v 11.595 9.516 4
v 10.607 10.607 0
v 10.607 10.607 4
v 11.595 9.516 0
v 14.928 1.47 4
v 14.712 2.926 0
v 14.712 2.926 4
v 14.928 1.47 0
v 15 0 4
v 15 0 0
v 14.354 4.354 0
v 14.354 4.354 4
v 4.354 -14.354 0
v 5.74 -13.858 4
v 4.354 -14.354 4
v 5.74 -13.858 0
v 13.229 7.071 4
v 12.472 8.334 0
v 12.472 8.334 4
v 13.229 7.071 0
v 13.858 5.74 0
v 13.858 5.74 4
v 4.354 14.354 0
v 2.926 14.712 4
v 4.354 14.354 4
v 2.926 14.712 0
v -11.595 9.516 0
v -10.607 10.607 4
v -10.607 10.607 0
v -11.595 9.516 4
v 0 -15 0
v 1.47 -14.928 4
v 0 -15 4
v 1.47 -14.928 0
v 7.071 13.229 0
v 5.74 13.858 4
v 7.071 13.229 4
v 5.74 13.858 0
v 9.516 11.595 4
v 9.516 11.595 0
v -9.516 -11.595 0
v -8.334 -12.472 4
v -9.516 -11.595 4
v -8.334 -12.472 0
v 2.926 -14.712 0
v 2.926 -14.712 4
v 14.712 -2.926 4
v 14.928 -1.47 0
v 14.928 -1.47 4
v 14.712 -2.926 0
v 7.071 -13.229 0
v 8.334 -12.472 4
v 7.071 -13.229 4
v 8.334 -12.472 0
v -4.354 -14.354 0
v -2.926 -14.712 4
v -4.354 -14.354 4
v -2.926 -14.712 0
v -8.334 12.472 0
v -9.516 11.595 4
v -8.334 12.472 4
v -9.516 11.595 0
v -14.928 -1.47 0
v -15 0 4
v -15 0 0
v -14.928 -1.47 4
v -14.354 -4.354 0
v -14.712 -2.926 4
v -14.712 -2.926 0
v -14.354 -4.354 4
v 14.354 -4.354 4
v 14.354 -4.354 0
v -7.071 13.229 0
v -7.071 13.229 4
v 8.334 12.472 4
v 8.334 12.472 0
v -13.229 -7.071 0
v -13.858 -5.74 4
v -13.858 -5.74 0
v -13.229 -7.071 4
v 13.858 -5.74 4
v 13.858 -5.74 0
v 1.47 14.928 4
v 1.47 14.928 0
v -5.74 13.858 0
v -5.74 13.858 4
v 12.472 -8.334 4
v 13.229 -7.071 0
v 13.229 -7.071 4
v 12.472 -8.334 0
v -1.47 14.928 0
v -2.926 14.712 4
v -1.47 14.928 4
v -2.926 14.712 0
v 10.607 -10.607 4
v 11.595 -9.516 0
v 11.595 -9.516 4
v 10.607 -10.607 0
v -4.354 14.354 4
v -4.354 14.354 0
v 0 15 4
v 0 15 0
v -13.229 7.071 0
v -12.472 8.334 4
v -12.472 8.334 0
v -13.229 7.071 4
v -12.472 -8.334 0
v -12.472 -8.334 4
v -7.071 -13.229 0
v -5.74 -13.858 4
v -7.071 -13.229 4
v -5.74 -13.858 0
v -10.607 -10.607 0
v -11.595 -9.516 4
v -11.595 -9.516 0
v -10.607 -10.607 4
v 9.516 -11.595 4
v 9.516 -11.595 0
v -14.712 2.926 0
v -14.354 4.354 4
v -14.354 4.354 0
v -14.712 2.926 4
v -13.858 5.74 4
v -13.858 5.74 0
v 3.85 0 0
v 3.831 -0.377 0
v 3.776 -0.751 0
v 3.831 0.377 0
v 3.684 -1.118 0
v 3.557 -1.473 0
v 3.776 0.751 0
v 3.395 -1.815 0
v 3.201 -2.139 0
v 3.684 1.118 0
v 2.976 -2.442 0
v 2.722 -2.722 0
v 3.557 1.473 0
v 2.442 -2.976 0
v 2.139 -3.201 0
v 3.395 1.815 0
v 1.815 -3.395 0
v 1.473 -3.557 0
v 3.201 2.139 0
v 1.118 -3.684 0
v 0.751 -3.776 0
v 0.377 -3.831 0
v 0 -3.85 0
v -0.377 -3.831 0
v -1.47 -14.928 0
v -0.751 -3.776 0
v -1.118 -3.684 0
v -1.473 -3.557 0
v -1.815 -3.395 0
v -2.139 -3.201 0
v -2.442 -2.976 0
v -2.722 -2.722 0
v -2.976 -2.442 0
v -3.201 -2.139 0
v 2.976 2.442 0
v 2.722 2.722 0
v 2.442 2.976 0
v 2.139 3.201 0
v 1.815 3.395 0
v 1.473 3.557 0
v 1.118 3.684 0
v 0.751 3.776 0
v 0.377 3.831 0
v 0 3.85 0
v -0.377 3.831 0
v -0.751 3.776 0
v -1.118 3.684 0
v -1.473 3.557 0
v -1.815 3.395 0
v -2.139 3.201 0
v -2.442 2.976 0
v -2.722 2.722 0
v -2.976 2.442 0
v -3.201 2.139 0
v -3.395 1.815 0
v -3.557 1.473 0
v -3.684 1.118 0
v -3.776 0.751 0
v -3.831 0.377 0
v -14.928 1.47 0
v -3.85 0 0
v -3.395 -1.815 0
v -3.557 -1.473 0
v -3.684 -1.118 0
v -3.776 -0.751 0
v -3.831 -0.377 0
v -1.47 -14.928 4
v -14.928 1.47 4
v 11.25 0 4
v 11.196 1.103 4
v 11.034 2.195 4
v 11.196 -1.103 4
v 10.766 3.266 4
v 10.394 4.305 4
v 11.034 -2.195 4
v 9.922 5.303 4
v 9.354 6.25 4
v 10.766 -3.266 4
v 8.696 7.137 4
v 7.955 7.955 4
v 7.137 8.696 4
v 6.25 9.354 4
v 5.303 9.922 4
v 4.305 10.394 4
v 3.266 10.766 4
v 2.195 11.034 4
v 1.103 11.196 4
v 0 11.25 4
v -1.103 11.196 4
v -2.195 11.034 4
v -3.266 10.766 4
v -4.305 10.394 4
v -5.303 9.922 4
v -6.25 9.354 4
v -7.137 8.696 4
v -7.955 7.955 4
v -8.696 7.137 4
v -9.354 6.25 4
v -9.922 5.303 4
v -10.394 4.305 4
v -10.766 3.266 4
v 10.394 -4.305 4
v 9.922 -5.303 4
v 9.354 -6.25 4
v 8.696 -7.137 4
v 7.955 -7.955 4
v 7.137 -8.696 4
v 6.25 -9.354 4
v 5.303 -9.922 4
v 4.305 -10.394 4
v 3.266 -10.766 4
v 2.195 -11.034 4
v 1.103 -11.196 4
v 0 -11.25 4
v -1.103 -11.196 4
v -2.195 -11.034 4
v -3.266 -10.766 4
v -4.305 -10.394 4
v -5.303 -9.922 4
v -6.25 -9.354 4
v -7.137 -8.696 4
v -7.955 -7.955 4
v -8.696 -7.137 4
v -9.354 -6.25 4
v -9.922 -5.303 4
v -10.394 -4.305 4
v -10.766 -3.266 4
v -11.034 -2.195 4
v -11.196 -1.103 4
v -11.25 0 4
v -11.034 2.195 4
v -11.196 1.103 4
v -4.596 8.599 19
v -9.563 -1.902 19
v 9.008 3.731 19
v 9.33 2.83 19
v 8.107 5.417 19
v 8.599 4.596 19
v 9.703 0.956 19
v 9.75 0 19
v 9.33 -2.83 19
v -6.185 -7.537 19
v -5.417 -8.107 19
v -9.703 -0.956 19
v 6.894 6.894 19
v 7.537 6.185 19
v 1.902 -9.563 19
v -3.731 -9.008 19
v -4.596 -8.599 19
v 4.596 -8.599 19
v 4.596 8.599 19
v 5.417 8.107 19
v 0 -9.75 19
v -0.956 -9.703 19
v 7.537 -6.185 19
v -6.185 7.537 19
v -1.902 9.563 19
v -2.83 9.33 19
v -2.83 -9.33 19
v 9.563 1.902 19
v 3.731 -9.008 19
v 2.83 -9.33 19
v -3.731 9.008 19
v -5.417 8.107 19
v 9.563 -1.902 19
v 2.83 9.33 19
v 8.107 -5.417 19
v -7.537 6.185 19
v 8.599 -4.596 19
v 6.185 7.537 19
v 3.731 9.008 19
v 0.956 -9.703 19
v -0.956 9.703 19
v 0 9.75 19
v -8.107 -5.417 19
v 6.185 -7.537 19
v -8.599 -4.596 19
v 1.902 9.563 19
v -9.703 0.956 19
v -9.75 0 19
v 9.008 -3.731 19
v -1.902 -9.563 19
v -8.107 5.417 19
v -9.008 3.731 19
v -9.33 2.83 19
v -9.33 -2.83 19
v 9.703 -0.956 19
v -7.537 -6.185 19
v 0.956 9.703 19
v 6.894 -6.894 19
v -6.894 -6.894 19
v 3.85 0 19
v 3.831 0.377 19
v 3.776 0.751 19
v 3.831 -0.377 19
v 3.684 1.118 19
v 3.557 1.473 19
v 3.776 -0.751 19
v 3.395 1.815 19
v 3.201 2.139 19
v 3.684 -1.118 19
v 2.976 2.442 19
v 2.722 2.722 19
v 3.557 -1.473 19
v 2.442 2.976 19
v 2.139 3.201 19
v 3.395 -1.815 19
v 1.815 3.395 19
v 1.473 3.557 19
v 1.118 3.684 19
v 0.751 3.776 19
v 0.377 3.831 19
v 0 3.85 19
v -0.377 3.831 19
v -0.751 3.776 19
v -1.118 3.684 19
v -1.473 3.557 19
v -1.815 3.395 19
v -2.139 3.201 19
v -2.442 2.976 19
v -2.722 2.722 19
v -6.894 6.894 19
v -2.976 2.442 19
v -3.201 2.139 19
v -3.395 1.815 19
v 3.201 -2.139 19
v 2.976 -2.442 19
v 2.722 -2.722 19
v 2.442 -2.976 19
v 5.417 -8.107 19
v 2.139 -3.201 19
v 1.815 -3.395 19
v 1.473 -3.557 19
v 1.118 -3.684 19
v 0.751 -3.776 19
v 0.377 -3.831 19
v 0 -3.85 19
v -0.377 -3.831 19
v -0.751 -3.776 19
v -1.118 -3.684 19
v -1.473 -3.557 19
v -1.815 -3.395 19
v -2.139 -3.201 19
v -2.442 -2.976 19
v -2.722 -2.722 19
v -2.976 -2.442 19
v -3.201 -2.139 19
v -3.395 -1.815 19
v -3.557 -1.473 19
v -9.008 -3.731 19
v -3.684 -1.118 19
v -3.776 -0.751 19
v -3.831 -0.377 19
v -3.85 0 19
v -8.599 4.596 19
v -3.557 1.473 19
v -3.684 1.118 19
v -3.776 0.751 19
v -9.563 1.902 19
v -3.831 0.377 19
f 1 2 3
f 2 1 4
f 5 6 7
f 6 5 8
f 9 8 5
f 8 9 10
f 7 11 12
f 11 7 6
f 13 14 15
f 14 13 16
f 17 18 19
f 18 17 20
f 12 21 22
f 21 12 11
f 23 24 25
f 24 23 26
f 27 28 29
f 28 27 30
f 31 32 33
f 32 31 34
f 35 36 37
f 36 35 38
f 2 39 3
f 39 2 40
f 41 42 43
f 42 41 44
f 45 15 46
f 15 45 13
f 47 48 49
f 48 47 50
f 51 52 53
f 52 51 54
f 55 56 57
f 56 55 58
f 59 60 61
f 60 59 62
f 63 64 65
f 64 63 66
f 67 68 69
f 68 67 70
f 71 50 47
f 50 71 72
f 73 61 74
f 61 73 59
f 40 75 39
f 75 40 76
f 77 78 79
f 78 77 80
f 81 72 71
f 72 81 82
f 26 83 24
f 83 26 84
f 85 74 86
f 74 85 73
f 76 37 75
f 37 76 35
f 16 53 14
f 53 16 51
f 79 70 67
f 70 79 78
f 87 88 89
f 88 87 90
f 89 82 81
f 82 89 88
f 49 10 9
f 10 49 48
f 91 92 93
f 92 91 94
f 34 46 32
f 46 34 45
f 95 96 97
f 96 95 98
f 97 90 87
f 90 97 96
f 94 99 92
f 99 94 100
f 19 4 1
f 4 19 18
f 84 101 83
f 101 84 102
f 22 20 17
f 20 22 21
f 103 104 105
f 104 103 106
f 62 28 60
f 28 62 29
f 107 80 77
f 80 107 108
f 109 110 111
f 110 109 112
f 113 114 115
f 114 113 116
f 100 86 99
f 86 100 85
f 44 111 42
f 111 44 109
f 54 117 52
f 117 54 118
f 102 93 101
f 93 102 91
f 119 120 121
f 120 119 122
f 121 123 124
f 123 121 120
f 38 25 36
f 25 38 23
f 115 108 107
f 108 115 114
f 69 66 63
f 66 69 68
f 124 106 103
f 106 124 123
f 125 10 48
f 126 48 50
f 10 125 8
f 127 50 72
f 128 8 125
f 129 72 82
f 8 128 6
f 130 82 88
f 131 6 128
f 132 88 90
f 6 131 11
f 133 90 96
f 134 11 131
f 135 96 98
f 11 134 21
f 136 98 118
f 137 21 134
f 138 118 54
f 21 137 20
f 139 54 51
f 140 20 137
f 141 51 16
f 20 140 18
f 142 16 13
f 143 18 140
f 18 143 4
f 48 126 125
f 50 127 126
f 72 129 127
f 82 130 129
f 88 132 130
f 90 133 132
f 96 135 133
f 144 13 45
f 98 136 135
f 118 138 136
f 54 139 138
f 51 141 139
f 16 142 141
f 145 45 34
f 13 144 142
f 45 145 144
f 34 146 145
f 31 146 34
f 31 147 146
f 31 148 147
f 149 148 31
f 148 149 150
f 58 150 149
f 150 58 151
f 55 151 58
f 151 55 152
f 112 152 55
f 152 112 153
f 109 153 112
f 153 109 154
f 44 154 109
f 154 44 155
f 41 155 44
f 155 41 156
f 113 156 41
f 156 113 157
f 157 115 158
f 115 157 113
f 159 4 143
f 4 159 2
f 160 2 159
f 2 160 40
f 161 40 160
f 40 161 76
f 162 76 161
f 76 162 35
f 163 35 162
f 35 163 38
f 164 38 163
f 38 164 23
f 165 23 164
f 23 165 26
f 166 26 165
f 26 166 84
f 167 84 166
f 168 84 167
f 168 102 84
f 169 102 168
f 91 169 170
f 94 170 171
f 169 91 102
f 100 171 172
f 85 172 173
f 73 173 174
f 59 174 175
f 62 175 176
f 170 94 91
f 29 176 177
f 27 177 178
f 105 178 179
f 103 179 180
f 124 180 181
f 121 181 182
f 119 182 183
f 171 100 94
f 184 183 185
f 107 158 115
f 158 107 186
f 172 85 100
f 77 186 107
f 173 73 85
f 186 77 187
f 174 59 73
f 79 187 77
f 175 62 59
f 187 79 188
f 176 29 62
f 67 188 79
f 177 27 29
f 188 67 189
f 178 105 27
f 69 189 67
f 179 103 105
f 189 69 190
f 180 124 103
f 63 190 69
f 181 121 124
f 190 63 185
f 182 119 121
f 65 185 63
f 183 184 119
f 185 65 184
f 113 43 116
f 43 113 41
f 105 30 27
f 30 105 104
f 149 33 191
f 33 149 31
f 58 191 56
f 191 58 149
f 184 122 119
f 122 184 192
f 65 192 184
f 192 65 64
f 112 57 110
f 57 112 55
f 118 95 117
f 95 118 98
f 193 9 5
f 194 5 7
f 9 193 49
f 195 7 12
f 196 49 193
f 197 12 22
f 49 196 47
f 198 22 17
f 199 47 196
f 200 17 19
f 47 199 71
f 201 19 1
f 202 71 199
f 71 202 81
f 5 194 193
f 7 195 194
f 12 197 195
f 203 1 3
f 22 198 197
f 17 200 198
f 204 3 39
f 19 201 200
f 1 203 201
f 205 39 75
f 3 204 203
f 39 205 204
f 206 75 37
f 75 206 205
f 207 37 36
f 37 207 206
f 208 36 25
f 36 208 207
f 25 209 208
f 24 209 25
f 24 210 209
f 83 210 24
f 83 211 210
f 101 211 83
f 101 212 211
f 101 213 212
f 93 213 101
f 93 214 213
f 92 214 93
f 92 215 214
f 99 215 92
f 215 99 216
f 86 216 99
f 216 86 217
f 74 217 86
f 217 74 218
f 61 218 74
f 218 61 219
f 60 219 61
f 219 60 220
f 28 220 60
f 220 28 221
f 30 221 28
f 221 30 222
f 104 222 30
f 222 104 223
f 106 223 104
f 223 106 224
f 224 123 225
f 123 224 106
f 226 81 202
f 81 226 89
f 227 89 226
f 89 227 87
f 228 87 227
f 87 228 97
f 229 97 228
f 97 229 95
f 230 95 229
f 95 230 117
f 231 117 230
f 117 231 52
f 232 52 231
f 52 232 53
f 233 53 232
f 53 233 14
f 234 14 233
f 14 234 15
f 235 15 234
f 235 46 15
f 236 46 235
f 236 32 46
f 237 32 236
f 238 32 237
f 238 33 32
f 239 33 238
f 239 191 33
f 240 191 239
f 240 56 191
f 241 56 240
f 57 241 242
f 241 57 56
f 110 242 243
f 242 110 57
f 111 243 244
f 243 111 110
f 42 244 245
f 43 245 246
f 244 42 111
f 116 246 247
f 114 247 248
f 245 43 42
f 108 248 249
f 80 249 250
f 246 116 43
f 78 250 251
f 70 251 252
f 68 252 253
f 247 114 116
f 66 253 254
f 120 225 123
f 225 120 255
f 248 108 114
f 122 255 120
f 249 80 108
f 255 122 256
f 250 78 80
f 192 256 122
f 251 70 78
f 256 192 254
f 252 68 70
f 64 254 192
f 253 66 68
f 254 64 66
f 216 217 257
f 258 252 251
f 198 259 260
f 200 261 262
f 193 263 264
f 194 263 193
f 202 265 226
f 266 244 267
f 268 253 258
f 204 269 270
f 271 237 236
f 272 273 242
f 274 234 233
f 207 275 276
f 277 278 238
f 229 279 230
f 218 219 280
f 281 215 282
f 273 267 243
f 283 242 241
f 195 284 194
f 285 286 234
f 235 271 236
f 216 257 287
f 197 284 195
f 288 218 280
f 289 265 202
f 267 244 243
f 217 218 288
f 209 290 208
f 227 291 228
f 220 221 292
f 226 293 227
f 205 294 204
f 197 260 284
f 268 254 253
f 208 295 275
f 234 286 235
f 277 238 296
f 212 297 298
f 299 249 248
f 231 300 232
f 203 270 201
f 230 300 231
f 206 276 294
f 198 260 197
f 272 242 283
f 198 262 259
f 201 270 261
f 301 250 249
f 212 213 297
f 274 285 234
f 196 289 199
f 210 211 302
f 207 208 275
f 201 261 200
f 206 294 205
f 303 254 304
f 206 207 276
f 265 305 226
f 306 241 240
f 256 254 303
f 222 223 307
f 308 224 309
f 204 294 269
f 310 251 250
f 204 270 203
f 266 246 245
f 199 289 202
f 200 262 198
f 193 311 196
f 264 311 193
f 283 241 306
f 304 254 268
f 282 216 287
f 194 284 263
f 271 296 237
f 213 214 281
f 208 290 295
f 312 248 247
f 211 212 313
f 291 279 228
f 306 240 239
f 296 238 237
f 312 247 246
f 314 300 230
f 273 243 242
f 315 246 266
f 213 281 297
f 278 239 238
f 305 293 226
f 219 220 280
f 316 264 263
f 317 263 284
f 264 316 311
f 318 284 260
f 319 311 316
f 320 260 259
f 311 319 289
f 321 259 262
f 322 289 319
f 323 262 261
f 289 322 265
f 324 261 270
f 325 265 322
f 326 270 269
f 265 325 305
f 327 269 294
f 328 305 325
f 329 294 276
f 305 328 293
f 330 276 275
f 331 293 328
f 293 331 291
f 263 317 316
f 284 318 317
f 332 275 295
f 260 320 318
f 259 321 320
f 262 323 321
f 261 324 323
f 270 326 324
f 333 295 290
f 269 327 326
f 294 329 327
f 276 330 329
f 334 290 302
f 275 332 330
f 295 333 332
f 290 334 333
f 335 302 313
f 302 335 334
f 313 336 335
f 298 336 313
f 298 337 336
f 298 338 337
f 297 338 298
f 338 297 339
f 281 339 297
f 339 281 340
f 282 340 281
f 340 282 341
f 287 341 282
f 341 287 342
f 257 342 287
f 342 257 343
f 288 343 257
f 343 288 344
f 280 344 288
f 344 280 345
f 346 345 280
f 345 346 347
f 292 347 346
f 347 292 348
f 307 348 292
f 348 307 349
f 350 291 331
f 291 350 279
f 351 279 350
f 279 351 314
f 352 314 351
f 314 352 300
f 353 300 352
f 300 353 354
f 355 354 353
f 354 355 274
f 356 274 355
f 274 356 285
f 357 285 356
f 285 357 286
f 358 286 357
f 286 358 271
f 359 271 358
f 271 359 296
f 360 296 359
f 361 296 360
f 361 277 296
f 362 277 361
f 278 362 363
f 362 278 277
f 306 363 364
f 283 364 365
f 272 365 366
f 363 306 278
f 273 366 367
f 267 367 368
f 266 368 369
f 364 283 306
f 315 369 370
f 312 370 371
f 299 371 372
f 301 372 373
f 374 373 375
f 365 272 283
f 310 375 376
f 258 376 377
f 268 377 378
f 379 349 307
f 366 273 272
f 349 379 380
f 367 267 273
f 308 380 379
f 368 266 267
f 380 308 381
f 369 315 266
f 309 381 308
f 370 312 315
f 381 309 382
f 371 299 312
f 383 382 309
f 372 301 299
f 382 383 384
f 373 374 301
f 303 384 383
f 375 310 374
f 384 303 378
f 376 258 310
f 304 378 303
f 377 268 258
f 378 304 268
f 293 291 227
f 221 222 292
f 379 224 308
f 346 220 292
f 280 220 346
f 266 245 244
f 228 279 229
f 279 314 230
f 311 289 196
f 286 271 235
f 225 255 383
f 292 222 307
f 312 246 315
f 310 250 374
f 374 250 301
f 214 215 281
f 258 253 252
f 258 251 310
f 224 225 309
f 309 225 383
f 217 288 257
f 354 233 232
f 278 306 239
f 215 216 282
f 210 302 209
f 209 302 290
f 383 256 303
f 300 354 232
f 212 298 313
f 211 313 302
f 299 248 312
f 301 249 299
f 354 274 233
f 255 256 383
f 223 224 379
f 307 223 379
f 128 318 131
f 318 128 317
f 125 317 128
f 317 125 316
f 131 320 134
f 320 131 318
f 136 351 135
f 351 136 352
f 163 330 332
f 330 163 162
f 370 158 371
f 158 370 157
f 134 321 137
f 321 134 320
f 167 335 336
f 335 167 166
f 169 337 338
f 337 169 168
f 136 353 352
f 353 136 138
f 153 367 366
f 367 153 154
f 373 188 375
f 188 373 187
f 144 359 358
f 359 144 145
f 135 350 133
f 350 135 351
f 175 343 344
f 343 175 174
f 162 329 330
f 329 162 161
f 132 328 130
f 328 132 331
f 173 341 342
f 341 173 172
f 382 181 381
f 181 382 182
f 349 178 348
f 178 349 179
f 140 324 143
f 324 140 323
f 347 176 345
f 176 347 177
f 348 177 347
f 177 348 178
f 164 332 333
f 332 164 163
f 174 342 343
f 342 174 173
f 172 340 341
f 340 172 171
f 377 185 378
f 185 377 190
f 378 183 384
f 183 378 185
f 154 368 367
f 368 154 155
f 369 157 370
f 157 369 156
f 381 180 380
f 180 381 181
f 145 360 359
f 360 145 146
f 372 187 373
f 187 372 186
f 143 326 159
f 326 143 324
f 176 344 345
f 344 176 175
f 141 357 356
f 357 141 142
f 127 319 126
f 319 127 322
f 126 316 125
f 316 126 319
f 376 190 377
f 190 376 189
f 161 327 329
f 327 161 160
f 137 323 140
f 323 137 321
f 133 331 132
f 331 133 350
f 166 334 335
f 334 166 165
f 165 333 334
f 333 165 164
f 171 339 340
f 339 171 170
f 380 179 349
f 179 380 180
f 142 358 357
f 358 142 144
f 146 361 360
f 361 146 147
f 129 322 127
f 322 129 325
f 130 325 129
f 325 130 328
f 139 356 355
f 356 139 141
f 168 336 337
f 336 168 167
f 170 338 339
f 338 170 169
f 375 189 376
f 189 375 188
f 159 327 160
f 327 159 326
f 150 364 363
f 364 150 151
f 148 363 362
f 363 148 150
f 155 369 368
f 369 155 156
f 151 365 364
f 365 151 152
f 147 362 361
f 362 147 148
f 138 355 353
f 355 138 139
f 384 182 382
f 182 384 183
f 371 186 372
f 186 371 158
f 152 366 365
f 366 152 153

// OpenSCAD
/**
 * Martin Egli
 * 2022-05-27
 * to close a PET bottle
 */

module pfropf1(loc_res = 64) {
    difference() {
        union() {
            translate([0, 0, 0])
            cylinder(d = 30, h = 4, $fn = loc_res);
            translate([0, 0, 4])
            cylinder(d1 = 21+1.5, d2= 21-1.5, h = 15, $fn = loc_res);
        }
        translate([0, 0, -1])
        cylinder(d = 7.7, h = 30, $fn = loc_res);
    }
}


pfropf1();
